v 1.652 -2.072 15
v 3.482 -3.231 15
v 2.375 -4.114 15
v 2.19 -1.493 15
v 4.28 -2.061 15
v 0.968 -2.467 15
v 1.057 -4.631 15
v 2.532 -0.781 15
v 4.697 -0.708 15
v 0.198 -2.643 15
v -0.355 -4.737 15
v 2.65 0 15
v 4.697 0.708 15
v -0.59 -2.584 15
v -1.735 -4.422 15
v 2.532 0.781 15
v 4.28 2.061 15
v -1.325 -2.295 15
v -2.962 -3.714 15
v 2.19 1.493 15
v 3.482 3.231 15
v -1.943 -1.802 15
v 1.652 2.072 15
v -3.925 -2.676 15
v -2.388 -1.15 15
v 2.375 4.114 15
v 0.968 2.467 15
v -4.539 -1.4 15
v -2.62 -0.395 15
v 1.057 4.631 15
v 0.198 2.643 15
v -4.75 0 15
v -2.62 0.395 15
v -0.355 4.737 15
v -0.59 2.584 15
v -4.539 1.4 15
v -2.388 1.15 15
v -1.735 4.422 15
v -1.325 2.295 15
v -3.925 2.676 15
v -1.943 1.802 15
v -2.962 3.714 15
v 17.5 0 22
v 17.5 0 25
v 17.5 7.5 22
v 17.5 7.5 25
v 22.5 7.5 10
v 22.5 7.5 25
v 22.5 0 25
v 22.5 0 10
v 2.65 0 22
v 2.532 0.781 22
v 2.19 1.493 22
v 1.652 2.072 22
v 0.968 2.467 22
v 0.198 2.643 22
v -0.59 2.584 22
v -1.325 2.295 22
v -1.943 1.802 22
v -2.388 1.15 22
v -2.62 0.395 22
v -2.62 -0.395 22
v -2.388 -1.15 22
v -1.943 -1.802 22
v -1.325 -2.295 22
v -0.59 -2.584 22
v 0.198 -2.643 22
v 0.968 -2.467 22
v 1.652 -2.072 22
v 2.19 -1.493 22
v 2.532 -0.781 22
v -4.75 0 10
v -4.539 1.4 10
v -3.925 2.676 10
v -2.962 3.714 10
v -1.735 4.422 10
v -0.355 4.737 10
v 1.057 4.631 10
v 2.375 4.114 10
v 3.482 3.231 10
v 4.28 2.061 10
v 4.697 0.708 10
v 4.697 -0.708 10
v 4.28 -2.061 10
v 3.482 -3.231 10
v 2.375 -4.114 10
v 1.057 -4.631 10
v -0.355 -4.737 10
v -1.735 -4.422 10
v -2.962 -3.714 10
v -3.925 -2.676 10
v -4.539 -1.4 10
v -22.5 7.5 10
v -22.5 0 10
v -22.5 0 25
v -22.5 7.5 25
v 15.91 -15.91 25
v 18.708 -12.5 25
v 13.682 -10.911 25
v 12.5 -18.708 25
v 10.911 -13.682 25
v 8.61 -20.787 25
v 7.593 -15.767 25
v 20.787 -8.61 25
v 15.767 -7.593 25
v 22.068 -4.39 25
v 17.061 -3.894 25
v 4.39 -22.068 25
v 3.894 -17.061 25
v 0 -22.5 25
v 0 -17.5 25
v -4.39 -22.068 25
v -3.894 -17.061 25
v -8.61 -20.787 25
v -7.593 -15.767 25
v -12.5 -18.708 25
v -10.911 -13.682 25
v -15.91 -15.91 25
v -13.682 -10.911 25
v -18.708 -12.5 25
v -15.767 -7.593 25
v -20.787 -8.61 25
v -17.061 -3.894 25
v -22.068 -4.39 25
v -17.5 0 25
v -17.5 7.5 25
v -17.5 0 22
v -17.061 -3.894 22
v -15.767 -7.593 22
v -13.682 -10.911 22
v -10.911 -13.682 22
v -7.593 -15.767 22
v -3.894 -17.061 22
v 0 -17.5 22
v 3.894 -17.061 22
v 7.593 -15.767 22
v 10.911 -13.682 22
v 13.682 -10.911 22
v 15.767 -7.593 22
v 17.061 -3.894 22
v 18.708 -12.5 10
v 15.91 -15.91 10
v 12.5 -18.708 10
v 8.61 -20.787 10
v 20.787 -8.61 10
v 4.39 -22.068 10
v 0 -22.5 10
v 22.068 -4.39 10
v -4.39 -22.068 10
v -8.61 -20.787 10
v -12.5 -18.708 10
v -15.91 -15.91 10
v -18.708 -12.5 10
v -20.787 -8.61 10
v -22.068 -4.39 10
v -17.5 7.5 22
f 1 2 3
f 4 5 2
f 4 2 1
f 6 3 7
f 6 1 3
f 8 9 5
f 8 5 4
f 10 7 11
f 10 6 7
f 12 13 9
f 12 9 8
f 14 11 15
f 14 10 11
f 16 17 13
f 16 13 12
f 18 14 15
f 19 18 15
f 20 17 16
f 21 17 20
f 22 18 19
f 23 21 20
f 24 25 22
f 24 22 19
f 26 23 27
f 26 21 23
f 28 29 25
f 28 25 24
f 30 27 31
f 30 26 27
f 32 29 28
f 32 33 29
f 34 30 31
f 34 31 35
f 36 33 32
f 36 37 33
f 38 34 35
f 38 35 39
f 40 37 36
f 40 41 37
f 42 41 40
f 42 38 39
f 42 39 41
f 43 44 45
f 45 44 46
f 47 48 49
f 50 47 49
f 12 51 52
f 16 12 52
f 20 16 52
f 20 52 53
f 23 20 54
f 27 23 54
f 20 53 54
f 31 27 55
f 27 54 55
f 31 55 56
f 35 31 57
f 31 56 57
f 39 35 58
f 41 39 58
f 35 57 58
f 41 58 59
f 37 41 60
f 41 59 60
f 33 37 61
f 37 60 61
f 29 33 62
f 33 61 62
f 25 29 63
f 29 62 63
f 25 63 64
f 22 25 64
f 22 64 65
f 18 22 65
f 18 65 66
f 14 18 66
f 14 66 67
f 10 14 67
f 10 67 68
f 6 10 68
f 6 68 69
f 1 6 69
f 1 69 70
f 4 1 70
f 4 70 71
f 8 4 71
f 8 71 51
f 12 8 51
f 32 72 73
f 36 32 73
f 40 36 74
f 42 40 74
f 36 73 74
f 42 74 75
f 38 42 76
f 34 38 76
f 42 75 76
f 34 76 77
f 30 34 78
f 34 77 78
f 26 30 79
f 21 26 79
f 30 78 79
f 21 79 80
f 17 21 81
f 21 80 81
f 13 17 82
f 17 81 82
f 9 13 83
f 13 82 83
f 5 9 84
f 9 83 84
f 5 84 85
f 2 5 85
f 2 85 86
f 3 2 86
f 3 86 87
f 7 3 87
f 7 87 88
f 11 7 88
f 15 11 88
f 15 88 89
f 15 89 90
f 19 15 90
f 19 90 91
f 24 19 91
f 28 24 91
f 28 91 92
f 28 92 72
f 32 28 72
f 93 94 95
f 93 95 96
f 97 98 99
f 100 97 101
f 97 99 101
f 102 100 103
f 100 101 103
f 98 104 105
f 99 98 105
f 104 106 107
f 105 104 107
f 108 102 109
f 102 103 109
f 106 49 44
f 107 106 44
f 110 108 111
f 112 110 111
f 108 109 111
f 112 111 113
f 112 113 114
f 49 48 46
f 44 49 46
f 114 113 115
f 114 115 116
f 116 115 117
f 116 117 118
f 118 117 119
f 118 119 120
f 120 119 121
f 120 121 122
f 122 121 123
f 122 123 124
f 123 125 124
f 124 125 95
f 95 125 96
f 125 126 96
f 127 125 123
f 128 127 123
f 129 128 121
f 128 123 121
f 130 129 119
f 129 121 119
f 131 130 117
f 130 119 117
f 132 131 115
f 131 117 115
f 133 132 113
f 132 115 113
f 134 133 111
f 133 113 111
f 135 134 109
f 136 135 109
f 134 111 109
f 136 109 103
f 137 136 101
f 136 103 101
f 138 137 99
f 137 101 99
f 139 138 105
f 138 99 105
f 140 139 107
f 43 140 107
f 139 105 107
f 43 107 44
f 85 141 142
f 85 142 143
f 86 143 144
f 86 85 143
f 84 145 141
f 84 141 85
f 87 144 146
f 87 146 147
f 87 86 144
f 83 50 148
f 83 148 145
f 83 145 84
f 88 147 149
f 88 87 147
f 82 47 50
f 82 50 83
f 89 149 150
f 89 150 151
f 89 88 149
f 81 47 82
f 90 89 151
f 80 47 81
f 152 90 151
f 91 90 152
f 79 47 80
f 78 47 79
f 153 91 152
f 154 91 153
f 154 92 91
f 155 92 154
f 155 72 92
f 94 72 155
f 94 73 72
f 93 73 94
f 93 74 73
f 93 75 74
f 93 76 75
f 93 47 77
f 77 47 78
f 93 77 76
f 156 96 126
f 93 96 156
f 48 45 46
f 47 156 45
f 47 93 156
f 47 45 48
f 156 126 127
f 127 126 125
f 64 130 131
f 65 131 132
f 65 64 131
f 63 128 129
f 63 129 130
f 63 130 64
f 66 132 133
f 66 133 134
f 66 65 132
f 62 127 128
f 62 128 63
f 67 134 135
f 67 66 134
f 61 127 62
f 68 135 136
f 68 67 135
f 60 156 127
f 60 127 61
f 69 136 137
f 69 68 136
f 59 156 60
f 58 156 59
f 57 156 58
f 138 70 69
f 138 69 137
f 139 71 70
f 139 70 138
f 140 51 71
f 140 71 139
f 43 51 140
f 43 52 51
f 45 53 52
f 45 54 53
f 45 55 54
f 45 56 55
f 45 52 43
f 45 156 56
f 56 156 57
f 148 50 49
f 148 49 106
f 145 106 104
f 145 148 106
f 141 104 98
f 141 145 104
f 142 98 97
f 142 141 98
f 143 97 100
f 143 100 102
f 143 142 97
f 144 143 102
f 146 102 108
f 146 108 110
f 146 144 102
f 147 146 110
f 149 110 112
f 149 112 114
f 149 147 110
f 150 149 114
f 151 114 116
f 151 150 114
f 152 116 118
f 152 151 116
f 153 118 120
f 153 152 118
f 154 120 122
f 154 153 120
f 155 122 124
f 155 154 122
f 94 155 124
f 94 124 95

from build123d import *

# Parameters (mm, degrees)
EXTRUDE_1_DEPTH          = 25
CUT_EXTRUDE_1_DEPTH      = 3
CUT_EXTRUDE_2_DEPTH      = 20
CUT_EXTRUDE_2_DEPTH_BACK = 35
SKETCH_3_W               = 45
SKETCH_3_H               = 15
SKETCH_4_R               = 2.65
CUT_EXTRUDE_3_DEPTH      = 35
SKETCH_5_R               = 4.75
CUT_EXTRUDE_4_DEPTH      = 15
SKETCH_6_R               = 24.891831438
CUT_EXTRUDE_5_DEPTH      = 10


with BuildPart() as part:
    # 草图1 → 凸台-拉伸1 (new body)
    with BuildSketch(Plane.XY):
        with BuildLine():
            Line((-22.5, 0), (-22.5, 22.5))
            Line((-22.5, 22.5), (22.5, 22.5))
            Line((22.5, 22.5), (22.5, 0))
            ThreePointArc((22.5, 0), (0, -22.5), (-22.5, 0))
        make_face()
    extrude(amount=EXTRUDE_1_DEPTH)

    # 草图2 → 切除-拉伸1 (cut)
    with BuildSketch(Plane.XY.offset(25)):
        with BuildLine():
            Line((17.5, 22.5), (-17.5, 22.5))
            Line((-17.5, 22.5), (-17.5, 0))
            ThreePointArc((-17.5, 0), (0, 17.5), (17.5, 0))
            Line((17.5, 0), (17.5, 22.5))
        make_face()
        with BuildLine():
            ThreePointArc((17.5, 0), (0, 17.5), (-17.5, 0))
            Line((-17.5, 0), (17.5, 0))
        make_face()
        with BuildLine():
            Line((17.5, 0), (-17.5, 0))
            ThreePointArc((-17.5, 0), (0, -17.5), (17.5, 0))
        make_face()
    extrude(amount=-CUT_EXTRUDE_1_DEPTH, mode=Mode.SUBTRACT)

    # 草图3 → 切除-拉伸2 (cut, two sides: drawn at the far end of the back side and taken through both)
    with BuildSketch(Plane.XY.offset(22).offset(-CUT_EXTRUDE_2_DEPTH_BACK)):
        with Locations((0, 15)):
            Rectangle(SKETCH_3_W, SKETCH_3_H)
    extrude(amount=CUT_EXTRUDE_2_DEPTH + CUT_EXTRUDE_2_DEPTH_BACK, mode=Mode.SUBTRACT)

    # 草图4 → 切除-拉伸3 (cut)
    with BuildSketch(Plane.XY.offset(22)):
        Circle(SKETCH_4_R)
    extrude(amount=-CUT_EXTRUDE_3_DEPTH, mode=Mode.SUBTRACT)

    # 草图5 → 切除-拉伸4 (cut)
    with BuildSketch(Plane(origin=(0, 0, 0), x_dir=(-1, 0, 0), z_dir=(0, 0, -1))):
        Circle(SKETCH_5_R)
    extrude(amount=-CUT_EXTRUDE_4_DEPTH, mode=Mode.SUBTRACT)

    # 草图6 → 切除-拉伸5 (cut)
    with BuildSketch(Plane(origin=(0, 0, 0), x_dir=(-1, 0, 0), z_dir=(0, 0, -1))):
        Circle(SKETCH_6_R)
    extrude(amount=-CUT_EXTRUDE_5_DEPTH, mode=Mode.SUBTRACT)


solid = part.part
